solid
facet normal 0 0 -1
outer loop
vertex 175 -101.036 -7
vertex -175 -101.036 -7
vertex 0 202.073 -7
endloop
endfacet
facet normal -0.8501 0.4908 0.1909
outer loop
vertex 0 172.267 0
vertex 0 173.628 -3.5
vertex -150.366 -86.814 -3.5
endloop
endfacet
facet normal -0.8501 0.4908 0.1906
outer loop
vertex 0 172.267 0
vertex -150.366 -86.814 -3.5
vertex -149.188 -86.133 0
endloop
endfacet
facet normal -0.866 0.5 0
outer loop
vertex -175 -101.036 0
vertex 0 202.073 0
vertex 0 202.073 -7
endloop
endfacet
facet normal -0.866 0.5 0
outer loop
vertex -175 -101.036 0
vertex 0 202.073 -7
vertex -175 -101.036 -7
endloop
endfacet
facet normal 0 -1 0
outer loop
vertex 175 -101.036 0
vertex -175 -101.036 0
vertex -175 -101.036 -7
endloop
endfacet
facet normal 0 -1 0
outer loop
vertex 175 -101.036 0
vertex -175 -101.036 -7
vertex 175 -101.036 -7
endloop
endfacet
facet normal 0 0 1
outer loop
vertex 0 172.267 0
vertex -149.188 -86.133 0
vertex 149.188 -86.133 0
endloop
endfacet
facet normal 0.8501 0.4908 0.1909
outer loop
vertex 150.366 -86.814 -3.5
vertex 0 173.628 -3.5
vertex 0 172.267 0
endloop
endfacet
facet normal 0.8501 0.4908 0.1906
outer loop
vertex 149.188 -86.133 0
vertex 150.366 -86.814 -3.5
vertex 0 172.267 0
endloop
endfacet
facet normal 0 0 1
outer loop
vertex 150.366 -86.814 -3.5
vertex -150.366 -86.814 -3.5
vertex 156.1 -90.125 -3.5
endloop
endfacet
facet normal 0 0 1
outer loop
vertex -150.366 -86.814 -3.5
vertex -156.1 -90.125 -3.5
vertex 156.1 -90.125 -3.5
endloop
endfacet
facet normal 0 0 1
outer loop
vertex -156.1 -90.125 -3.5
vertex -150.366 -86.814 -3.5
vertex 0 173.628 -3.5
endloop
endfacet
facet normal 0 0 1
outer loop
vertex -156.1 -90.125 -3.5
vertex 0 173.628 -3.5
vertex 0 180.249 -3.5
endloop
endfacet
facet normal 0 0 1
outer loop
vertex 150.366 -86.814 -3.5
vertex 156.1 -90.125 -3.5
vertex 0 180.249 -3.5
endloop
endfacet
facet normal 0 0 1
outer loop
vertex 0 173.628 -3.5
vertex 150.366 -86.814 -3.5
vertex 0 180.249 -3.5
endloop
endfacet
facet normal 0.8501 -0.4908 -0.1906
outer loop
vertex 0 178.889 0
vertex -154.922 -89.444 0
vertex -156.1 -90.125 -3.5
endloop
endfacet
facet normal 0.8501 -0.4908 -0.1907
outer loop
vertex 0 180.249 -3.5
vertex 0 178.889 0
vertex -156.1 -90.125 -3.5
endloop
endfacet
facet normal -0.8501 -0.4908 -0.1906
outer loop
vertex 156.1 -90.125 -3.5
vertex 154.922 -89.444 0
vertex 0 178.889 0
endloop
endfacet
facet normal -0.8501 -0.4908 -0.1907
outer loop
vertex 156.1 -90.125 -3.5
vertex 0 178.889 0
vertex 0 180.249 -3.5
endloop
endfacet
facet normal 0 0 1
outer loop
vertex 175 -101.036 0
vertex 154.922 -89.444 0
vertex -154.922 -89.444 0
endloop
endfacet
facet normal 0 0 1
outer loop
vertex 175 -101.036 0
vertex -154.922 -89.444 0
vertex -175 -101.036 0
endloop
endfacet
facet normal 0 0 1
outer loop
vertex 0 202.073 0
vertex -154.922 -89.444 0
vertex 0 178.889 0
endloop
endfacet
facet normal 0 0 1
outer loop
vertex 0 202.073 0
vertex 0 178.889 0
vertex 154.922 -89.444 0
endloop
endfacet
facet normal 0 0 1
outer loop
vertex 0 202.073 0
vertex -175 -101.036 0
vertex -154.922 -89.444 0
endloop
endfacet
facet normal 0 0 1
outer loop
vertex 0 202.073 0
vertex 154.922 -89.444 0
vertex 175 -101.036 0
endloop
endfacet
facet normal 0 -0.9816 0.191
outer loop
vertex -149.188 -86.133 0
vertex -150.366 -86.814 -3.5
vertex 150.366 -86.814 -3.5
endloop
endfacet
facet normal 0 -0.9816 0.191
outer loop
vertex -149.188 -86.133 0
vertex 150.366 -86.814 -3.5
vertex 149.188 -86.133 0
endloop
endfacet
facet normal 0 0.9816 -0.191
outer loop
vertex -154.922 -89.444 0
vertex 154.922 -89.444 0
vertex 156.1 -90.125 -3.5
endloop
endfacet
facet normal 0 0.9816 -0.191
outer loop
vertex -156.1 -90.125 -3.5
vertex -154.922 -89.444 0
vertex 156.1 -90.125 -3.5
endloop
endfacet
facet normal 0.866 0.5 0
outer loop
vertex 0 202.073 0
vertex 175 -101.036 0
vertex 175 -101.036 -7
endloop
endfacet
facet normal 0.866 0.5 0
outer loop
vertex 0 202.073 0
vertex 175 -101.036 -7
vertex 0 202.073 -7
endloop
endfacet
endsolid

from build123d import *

# Parameters (mm, degrees)
F4_DEPTH = 7


with BuildPart() as f4:
    # F0 (on Top) → F4 (new body)
    with BuildSketch(Plane.XY):
        Polygon((175, -101.0362971082), (0, 202.0725942164), (-175, -101.0362971082), align=None)
    extrude(amount=-F4_DEPTH)

    # F3: sweep along a path in F2
    with BuildLine(Plane.XY) as f3_path:
        Line((-149.1875, -86.1334432847), (149.1875, -86.1334432847))
        Line((149.1875, -86.1334432847), (0, 172.2668865695))
        Line((0, 172.2668865695), (-149.1875, -86.1334432847))
    # F1 (on Right) → F3 (sweep, cut)
    with BuildSketch(Plane.YZ):
        Polygon((-86.8137743667, -3.5), (-86.1334432847, 0), (-89.4442725433, 0), (-90.1246036253, -3.5), align=None)
    sweep(path=f3_path.line, transition=Transition.RIGHT, mode=Mode.SUBTRACT)


solid = f4.part
